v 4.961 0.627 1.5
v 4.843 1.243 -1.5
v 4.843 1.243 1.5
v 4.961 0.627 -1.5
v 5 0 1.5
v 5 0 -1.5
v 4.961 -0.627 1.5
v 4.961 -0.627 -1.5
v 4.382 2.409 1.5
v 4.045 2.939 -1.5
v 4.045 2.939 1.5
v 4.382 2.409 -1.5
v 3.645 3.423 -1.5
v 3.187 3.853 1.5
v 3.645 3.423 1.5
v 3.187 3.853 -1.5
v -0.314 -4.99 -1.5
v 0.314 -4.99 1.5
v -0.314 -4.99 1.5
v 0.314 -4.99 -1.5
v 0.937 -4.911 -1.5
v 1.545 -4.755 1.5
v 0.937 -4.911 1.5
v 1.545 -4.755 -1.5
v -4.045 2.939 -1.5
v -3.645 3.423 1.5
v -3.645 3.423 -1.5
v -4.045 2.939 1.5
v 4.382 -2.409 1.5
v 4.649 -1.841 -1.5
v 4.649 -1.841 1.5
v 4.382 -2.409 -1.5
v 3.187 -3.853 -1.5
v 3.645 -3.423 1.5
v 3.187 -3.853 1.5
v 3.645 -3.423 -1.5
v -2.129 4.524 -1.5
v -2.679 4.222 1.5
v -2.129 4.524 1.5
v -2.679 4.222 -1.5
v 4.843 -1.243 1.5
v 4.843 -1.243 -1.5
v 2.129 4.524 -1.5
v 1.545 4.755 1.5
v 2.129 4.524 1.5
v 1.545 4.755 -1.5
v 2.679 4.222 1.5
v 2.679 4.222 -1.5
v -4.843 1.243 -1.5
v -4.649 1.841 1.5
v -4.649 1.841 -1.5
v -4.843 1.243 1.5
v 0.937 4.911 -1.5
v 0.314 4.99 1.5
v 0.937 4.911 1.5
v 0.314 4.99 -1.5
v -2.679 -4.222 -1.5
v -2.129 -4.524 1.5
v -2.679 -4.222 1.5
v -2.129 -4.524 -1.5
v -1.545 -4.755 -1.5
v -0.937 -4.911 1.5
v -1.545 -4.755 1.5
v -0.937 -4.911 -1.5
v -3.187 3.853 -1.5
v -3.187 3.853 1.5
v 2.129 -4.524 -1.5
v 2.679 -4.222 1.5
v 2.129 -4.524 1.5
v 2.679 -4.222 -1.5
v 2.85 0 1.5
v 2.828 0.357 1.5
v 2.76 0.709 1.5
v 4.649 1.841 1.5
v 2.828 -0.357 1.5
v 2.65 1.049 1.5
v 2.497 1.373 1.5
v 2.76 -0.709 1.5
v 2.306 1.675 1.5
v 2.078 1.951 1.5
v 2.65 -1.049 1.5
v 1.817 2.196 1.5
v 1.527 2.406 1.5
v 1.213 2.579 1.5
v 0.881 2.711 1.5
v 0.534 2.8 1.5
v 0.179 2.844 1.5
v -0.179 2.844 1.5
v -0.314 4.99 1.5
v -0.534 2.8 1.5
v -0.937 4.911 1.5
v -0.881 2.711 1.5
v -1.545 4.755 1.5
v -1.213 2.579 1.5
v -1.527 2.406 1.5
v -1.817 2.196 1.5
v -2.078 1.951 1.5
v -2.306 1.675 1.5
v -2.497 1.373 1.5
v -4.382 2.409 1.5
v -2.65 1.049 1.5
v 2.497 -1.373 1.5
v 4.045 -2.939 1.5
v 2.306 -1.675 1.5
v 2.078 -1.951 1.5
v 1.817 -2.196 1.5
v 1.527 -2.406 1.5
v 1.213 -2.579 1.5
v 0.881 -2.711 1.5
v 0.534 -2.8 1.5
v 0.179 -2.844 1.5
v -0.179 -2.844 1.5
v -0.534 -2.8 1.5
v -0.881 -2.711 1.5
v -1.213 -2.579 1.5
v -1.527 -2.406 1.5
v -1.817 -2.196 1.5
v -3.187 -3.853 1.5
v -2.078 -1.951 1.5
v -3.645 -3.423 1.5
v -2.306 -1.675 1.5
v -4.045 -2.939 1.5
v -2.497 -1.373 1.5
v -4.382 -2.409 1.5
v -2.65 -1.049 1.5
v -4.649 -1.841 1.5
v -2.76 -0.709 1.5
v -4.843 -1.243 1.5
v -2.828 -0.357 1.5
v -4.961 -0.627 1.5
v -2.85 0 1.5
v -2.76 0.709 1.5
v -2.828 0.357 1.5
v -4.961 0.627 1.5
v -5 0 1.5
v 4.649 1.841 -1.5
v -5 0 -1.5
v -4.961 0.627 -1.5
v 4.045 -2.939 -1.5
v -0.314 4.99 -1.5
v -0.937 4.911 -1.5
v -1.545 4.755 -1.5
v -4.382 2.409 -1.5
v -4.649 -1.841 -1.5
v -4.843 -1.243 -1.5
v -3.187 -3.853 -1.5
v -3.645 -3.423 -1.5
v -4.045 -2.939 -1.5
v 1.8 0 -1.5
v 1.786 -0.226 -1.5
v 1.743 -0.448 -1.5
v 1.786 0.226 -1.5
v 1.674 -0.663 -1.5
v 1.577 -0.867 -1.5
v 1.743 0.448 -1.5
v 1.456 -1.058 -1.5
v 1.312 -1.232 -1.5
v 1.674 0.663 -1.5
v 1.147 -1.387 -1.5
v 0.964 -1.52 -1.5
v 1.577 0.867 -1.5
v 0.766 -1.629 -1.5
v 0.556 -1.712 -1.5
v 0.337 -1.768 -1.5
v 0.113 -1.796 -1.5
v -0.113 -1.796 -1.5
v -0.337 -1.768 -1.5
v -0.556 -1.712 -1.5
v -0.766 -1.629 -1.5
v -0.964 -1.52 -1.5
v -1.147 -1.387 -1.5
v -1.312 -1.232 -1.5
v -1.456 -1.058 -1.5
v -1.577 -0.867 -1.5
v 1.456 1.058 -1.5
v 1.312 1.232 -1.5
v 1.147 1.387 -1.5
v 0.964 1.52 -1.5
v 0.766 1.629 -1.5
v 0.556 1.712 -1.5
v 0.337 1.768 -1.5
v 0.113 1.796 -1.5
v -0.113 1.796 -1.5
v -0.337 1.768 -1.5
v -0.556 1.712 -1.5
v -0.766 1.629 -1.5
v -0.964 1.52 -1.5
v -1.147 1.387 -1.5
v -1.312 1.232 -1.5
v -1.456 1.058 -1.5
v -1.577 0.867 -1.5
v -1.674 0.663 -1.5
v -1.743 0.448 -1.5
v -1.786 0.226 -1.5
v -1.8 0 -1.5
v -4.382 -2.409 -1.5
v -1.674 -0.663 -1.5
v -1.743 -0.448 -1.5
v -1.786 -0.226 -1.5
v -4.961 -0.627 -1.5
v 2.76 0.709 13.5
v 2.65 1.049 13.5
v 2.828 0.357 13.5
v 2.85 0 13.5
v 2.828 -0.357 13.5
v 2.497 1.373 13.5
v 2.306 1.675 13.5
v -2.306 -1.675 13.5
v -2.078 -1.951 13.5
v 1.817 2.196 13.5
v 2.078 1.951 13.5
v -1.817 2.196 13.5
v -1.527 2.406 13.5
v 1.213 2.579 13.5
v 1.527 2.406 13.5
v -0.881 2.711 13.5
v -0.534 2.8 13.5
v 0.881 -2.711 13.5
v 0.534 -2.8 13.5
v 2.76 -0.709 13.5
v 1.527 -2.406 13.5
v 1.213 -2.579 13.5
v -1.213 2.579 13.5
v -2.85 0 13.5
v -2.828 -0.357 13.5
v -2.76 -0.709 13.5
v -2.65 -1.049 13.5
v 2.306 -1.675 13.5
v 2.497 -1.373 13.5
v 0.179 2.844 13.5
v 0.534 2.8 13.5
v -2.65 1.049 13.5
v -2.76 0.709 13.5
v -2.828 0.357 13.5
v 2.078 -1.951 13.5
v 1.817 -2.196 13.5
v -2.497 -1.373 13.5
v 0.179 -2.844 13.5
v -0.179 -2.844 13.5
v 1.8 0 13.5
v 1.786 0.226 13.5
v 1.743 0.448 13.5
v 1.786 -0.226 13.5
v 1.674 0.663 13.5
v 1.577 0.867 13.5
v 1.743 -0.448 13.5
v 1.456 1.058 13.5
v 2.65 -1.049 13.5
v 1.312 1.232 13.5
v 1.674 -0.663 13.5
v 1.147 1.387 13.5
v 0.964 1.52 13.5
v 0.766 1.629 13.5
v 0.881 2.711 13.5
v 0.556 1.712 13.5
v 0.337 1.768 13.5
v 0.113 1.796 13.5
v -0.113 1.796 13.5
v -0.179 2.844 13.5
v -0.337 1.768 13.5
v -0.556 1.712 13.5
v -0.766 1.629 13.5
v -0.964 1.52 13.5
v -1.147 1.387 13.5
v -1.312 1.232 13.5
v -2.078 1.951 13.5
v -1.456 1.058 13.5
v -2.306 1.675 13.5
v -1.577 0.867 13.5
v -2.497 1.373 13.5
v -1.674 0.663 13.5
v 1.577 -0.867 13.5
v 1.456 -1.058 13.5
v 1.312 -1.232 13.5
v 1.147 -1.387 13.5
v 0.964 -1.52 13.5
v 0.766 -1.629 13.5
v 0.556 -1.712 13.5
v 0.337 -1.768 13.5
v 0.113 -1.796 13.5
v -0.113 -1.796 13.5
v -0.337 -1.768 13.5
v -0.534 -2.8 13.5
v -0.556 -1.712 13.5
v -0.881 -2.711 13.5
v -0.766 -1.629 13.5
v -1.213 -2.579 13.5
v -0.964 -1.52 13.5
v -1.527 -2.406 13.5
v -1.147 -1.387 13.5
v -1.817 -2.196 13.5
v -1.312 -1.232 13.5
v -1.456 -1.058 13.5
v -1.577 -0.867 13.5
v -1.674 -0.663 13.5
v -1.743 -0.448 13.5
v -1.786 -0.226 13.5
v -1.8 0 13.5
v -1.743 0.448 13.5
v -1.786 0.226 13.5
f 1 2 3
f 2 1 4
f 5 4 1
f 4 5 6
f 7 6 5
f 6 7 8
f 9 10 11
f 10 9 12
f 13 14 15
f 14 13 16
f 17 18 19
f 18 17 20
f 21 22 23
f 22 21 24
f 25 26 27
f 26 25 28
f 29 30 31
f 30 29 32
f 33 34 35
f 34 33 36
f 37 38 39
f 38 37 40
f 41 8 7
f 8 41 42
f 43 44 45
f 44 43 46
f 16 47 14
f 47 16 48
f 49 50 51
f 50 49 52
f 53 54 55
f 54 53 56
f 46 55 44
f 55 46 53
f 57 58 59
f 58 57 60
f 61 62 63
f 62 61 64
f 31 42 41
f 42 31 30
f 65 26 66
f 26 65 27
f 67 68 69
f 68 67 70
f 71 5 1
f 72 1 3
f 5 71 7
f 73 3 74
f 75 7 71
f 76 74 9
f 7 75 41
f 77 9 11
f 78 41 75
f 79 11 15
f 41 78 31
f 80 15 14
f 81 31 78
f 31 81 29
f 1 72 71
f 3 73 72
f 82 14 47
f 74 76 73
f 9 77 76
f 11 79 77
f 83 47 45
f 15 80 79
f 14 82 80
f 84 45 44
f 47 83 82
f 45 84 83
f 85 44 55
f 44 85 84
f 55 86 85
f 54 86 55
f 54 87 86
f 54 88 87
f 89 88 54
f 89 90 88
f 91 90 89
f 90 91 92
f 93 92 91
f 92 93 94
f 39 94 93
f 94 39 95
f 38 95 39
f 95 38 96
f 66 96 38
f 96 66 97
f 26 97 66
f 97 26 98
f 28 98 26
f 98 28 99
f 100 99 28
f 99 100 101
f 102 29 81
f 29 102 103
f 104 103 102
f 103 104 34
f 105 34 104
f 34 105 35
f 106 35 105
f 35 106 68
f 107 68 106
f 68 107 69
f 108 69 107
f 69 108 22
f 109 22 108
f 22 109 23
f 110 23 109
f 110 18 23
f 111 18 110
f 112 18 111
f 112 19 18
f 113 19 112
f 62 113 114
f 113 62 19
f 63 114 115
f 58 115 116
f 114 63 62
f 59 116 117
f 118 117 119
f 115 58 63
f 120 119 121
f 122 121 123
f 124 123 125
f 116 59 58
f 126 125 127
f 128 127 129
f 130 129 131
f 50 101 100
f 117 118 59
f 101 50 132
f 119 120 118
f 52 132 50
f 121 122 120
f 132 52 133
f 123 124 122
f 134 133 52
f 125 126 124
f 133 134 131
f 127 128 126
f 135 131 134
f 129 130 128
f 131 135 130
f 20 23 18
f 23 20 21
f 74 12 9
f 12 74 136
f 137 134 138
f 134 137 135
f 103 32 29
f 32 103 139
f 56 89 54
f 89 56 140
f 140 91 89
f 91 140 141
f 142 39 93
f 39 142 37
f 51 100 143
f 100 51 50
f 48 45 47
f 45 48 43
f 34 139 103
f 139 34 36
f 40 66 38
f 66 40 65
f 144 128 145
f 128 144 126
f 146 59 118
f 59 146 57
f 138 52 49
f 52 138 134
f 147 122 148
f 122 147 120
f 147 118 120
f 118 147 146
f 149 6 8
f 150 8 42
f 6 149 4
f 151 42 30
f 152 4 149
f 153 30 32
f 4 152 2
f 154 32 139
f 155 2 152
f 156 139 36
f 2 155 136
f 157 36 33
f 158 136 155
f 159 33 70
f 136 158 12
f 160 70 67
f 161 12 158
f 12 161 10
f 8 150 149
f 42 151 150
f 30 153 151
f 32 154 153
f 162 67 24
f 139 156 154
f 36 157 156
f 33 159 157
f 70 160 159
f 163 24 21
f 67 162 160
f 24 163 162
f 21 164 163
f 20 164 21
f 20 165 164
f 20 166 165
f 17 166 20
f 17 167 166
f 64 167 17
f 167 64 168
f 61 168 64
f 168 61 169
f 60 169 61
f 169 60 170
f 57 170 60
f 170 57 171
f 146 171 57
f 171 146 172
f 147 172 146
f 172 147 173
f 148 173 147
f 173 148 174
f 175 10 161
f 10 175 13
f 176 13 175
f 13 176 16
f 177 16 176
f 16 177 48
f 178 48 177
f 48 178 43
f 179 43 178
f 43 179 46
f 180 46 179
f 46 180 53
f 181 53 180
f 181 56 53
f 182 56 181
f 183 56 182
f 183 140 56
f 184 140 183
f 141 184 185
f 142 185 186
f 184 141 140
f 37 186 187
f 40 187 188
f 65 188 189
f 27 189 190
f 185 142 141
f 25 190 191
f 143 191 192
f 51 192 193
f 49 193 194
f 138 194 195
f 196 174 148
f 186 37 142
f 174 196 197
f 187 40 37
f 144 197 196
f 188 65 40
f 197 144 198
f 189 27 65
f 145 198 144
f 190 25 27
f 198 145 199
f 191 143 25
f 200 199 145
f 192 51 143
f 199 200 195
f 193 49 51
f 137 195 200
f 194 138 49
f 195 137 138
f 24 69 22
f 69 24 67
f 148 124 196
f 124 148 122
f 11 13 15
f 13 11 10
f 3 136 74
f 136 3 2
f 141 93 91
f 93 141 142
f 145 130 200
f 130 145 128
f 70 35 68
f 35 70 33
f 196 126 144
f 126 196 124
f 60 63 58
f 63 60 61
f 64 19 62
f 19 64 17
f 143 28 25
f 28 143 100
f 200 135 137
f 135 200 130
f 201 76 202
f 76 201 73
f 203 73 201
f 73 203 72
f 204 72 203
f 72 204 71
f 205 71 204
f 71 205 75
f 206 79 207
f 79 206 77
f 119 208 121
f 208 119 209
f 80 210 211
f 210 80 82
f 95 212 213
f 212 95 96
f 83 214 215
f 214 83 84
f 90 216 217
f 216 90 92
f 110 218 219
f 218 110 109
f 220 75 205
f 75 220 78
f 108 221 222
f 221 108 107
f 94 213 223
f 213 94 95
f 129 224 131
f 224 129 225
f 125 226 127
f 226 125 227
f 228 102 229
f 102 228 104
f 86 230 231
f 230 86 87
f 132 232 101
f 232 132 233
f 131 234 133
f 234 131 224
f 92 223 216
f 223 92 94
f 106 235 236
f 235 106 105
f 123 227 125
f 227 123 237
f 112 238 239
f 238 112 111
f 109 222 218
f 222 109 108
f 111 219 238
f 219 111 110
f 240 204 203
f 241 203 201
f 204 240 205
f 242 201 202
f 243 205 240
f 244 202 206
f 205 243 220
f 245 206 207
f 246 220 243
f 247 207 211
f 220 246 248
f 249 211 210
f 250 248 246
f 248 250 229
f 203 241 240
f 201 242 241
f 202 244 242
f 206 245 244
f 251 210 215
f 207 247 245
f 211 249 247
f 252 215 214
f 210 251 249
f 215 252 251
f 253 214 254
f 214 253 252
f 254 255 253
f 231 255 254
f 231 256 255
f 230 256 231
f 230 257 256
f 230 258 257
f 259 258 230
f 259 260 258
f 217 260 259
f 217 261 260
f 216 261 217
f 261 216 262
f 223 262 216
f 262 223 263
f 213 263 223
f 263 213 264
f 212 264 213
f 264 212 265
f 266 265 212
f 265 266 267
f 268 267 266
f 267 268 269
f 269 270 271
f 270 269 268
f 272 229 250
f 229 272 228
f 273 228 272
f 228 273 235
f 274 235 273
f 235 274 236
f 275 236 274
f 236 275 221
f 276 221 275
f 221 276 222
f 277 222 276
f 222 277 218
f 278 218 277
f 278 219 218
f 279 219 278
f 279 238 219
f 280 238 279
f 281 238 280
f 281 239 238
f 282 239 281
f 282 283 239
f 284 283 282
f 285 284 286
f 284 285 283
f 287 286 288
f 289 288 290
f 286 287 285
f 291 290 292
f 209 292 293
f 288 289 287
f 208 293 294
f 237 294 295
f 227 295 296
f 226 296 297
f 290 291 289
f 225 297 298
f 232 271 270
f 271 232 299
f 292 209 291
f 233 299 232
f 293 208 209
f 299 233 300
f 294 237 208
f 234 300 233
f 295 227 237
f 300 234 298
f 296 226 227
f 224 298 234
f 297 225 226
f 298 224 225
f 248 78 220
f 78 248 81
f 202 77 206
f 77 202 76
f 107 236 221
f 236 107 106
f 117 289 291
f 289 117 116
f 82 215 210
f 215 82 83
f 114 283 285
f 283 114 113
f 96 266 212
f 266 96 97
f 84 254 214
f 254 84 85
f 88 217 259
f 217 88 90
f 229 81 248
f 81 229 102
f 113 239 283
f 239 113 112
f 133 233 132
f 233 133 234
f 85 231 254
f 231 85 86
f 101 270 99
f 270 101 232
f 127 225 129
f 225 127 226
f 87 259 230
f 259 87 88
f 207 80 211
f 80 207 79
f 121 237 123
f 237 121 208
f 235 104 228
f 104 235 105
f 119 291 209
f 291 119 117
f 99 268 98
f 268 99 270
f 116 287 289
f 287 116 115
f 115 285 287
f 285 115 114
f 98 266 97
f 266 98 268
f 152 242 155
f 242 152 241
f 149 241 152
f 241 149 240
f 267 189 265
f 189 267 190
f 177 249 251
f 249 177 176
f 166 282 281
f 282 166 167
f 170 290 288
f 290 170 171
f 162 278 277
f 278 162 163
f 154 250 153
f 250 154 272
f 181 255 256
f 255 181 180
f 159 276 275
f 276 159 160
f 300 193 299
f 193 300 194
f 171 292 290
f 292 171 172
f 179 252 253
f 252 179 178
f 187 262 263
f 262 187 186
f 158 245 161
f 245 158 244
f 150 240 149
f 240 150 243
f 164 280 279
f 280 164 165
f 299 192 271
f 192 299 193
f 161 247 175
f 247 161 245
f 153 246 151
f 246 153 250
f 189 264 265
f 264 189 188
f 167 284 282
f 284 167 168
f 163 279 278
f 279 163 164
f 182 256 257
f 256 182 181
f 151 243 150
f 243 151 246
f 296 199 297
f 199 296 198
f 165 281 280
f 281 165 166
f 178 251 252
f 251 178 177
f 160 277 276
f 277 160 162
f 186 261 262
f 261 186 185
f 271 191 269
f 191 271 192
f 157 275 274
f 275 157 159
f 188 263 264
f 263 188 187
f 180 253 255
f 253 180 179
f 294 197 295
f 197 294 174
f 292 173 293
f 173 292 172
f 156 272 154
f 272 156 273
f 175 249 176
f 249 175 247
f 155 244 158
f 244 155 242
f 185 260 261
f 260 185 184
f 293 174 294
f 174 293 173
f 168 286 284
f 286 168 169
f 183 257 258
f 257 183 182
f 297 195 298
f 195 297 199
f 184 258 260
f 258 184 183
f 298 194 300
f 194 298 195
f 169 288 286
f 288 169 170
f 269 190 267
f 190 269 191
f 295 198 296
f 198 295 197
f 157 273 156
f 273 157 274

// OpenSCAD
$fn = 50;


difference() {
	union() {
		translate(v = [0, 0, -1.5000000000]) {
			cylinder(h = 3, r = 5.0000000000);
		}
		translate(v = [0, 0, -1.5000000000]) {
			cylinder(h = 15, r = 2.8500000000);
		}
	}
	union() {
		translate(v = [0, 0, -50.0000000000]) {
			cylinder(h = 100, r = 1.8000000000);
		}
	}
}
